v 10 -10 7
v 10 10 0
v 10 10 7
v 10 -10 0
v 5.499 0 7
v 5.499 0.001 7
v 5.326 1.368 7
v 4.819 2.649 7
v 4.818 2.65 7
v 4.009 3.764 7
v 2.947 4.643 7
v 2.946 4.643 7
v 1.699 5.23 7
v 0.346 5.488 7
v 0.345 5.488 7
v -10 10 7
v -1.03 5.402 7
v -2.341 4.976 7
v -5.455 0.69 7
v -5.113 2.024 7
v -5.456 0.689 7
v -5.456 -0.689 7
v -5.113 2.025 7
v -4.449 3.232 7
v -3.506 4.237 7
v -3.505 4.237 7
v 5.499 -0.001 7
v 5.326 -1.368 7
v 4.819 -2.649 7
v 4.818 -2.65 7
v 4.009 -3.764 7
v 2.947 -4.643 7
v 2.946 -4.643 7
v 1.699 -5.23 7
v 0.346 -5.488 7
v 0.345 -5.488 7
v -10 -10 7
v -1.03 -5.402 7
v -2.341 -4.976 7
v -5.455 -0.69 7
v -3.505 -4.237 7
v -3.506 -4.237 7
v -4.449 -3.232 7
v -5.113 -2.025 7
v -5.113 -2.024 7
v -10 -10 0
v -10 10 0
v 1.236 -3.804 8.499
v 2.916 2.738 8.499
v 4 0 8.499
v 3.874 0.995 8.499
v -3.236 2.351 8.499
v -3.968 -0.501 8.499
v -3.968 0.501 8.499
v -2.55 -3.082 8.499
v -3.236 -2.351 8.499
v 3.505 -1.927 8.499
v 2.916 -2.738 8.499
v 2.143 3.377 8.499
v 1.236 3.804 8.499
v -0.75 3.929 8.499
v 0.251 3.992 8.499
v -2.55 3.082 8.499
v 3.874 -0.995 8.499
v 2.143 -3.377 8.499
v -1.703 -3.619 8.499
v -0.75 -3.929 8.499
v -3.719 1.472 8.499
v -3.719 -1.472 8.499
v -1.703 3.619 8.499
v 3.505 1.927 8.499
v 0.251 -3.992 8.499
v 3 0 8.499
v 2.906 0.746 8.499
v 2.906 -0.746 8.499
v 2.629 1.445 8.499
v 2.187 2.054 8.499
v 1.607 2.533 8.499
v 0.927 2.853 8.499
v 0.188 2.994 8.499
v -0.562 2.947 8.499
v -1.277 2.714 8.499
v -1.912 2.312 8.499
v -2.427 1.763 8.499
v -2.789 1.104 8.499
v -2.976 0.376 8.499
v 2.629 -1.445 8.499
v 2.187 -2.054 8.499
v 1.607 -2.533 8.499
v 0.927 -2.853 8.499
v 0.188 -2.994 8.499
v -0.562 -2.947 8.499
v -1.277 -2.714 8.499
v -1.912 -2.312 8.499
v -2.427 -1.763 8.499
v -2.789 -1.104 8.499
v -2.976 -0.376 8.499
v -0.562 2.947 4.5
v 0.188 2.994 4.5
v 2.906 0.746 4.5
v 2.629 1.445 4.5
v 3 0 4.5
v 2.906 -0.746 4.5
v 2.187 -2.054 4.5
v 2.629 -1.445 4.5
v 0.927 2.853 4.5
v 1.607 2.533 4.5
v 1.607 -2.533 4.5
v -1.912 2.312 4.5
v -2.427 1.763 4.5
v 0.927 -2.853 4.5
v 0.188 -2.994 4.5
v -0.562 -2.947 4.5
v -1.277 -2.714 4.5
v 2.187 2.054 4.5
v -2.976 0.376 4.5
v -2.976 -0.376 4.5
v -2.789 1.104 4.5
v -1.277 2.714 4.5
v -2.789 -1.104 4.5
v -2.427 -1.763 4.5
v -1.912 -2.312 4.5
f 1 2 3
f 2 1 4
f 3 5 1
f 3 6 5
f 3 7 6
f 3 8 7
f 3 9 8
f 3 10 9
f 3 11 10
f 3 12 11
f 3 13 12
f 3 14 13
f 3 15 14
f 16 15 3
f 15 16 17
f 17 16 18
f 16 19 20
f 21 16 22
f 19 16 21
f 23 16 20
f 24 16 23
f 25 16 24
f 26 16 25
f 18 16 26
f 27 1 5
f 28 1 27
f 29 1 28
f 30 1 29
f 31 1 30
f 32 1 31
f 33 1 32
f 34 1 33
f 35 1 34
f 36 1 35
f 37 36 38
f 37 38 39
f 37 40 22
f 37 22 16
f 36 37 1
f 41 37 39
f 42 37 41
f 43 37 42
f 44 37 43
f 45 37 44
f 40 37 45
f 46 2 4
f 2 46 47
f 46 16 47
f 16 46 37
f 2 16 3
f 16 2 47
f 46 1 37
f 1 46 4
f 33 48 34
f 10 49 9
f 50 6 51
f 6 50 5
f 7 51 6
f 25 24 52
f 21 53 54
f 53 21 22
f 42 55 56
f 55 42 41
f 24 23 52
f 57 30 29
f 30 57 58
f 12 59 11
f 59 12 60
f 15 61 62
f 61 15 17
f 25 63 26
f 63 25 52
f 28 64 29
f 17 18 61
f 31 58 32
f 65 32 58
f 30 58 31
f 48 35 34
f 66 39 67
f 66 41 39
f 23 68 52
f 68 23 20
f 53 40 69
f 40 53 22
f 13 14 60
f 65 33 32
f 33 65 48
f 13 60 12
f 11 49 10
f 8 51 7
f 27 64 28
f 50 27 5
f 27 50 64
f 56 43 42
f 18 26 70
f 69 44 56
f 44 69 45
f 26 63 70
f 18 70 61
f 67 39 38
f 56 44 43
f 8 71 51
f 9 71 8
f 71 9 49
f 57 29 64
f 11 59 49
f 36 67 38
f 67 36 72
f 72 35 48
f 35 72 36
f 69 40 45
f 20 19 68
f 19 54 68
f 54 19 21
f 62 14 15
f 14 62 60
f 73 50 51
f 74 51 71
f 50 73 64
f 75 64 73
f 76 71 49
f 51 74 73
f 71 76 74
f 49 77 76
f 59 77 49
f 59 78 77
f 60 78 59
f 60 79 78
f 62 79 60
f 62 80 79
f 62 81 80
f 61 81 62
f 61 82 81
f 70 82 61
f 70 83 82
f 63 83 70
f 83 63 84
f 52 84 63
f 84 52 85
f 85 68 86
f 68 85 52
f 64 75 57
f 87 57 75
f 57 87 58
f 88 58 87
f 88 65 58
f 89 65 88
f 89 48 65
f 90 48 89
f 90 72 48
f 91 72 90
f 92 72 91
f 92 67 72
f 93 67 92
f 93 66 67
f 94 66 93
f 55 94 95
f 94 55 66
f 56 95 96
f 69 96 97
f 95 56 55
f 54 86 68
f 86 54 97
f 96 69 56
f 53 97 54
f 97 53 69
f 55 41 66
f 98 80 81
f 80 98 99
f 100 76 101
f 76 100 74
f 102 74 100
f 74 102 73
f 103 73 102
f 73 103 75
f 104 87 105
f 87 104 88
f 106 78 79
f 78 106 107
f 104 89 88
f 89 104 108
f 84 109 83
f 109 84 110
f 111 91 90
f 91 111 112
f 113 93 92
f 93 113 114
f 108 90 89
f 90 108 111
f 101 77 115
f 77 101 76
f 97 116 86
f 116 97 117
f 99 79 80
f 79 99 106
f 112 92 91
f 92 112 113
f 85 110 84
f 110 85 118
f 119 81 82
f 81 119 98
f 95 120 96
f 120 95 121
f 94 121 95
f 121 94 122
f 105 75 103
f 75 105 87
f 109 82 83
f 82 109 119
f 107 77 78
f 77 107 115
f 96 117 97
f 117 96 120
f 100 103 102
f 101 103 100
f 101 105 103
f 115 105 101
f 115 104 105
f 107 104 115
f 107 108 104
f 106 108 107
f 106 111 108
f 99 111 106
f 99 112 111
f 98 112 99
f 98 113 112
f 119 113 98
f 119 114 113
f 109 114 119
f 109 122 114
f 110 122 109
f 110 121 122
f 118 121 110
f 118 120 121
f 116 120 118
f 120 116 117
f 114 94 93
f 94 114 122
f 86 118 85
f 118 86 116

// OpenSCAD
w = 20;
h = w;
d = 7;
hole_dia = 6;
hole_d = 4;
hole_fringe = 1.5;
fringe_extra = 1.0;
eps = 0.001;

module stopper() {
    difference() {
        union() {
        translate([-w/2, -h/2, 0]) cube([w, h, d]);
        translate([0, 0, d-eps]) cylinder(d1=hole_dia+2*hole_fringe+2*fringe_extra, d2=hole_dia+2*fringe_extra, h=hole_fringe);
        }
        translate([0, 0, d+hole_fringe-hole_d]) cylinder(d=hole_dia, h=hole_d+eps);
    }
}

stopper($fn=25);
